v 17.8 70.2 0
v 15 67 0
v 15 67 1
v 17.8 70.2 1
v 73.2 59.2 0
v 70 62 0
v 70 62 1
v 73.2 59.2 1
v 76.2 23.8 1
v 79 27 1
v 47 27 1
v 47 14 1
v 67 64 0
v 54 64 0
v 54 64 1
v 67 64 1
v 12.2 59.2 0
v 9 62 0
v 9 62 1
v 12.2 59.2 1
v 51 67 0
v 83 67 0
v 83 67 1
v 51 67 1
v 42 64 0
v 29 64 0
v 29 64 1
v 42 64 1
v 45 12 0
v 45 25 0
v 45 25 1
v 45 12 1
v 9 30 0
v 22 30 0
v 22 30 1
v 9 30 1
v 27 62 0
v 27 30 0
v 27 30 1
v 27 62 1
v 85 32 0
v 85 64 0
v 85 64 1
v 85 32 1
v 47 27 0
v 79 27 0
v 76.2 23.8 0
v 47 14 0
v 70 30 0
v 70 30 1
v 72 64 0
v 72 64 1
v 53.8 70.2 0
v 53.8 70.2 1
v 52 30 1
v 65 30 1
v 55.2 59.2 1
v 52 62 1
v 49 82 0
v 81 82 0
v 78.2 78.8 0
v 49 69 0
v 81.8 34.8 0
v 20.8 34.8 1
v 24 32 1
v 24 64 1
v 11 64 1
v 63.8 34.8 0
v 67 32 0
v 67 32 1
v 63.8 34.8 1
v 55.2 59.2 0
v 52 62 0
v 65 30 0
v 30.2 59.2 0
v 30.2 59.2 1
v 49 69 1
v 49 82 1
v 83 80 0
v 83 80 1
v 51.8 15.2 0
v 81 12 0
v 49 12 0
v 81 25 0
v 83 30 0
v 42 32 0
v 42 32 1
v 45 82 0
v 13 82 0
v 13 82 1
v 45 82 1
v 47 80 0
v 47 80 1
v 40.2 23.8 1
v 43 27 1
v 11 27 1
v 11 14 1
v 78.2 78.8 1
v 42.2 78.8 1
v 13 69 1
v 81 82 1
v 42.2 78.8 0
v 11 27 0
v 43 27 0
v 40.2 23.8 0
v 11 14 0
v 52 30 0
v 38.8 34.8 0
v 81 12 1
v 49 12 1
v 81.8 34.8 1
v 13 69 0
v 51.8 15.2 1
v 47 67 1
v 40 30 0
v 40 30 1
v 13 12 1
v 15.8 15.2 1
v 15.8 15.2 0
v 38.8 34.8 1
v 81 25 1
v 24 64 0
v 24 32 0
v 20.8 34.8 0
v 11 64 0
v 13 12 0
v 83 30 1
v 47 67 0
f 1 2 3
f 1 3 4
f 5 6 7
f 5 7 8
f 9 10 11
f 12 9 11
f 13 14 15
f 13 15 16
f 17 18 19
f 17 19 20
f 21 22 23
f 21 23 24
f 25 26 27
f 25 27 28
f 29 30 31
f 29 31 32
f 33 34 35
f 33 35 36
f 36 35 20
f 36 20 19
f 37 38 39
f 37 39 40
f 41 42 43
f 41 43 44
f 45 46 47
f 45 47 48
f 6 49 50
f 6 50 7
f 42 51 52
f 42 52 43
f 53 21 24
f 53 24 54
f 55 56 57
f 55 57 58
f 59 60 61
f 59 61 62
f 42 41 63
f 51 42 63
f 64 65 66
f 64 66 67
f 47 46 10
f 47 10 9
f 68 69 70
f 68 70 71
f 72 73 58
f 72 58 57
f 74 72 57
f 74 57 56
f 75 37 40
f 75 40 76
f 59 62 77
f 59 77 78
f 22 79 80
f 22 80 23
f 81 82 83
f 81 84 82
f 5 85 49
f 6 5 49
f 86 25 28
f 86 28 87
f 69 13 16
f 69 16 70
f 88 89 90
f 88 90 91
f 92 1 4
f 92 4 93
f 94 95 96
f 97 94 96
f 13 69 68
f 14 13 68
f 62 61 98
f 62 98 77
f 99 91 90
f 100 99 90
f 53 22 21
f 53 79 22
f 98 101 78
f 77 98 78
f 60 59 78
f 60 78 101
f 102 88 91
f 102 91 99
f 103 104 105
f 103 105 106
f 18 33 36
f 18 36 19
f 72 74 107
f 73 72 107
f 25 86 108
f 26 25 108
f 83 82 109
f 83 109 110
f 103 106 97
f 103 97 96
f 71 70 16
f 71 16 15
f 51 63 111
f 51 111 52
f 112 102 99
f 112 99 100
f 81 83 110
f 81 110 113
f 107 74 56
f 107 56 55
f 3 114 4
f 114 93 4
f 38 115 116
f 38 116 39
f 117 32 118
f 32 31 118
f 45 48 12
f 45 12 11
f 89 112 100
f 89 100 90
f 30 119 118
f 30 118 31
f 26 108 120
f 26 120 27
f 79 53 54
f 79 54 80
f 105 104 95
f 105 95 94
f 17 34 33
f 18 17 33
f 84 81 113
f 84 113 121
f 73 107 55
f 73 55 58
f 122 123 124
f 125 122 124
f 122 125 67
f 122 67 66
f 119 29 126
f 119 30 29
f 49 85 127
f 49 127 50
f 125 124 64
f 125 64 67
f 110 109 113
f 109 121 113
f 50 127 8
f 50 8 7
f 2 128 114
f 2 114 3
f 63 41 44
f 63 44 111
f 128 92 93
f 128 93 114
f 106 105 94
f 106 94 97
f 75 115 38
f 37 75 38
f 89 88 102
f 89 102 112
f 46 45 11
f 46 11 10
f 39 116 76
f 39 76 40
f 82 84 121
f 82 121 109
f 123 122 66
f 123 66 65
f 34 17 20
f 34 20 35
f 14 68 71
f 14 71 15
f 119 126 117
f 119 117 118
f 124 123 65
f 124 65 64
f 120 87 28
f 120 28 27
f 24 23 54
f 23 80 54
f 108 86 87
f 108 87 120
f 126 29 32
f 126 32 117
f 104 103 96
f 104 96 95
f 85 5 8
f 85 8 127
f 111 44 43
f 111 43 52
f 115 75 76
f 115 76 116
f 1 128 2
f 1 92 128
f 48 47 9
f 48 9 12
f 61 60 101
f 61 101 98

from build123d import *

# Parameters (mm, degrees)
BOSS_EXTRUDE1_DEPTH    = 1
BOSS_EXTRUDE1_2_DEPTH  = 1
BOSS_EXTRUDE1_3_DEPTH  = 1
BOSS_EXTRUDE1_4_DEPTH  = 1
BOSS_EXTRUDE1_5_DEPTH  = 1
BOSS_EXTRUDE1_6_DEPTH  = 1
BOSS_EXTRUDE1_7_DEPTH  = 1
BOSS_EXTRUDE1_8_DEPTH  = 1
BOSS_EXTRUDE1_9_DEPTH  = 1
BOSS_EXTRUDE1_10_DEPTH = 1
BOSS_EXTRUDE1_11_DEPTH = 1
BOSS_EXTRUDE1_12_DEPTH = 1
BOSS_EXTRUDE1_13_DEPTH = 1
BOSS_EXTRUDE1_14_DEPTH = 1
BOSS_EXTRUDE1_15_DEPTH = 1
BOSS_EXTRUDE1_16_DEPTH = 1


with BuildPart() as part:
    # Sketch 21 → Boss-Extrude1 (new body)
    with BuildSketch(Plane.XY):
        Polygon((45, 12), (13, 12), (15.8, 15.2), (45, 25), align=None)
    extrude(amount=BOSS_EXTRUDE1_DEPTH)


with BuildPart() as body_2:
    # Sketch 21 → Boss-Extrude1 2 (new body)
    with BuildSketch(Plane.XY):
        Polygon((11, 27), (43, 27), (40.2, 23.8), (11, 14), align=None)
    extrude(amount=BOSS_EXTRUDE1_2_DEPTH)


with BuildPart() as body_3:
    # Sketch 21 → Boss-Extrude1 3 (new body)
    with BuildSketch(Plane.XY):
        Polygon((47, 27), (79, 27), (76.2, 23.8), (47, 14), align=None)
    extrude(amount=BOSS_EXTRUDE1_3_DEPTH)


with BuildPart() as body_4:
    # Sketch 21 → Boss-Extrude1 4 (new body)
    with BuildSketch(Plane.XY):
        Polygon((81, 12), (49, 12), (51.8, 15.2), (81, 25), align=None)
    extrude(amount=BOSS_EXTRUDE1_4_DEPTH)


with BuildPart() as body_5:
    # Sketch 21 → Boss-Extrude1 5 (new body)
    with BuildSketch(Plane.XY):
        Polygon((9, 30), (9, 62), (12.2, 59.2), (22, 30), align=None)
    extrude(amount=BOSS_EXTRUDE1_5_DEPTH)


with BuildPart() as body_6:
    # Sketch 21 → Boss-Extrude1 6 (new body)
    with BuildSketch(Plane.XY):
        Polygon((24, 64), (24, 32), (20.8, 34.8), (11, 64), align=None)
    extrude(amount=BOSS_EXTRUDE1_6_DEPTH)


with BuildPart() as body_7:
    # Sketch 21 → Boss-Extrude1 7 (new body)
    with BuildSketch(Plane.XY):
        Polygon((27, 30), (27, 62), (30.2, 59.2), (40, 30), align=None)
    extrude(amount=BOSS_EXTRUDE1_7_DEPTH)


with BuildPart() as body_8:
    # Sketch 21 → Boss-Extrude1 8 (new body)
    with BuildSketch(Plane.XY):
        Polygon((42, 64), (42, 32), (38.8, 34.8), (29, 64), align=None)
    extrude(amount=BOSS_EXTRUDE1_8_DEPTH)


with BuildPart() as body_9:
    # Sketch 21 → Boss-Extrude1 9 (new body)
    with BuildSketch(Plane.XY):
        Polygon((52, 30), (52, 62), (55.2, 59.2), (65, 30), align=None)
    extrude(amount=BOSS_EXTRUDE1_9_DEPTH)


with BuildPart() as body_10:
    # Sketch 21 → Boss-Extrude1 10 (new body)
    with BuildSketch(Plane.XY):
        Polygon((67, 64), (67, 32), (63.8, 34.8), (54, 64), align=None)
    extrude(amount=BOSS_EXTRUDE1_10_DEPTH)


with BuildPart() as body_11:
    # Sketch 21 → Boss-Extrude1 11 (new body)
    with BuildSketch(Plane.XY):
        Polygon((70, 30), (70, 62), (73.2, 59.2), (83, 30), align=None)
    extrude(amount=BOSS_EXTRUDE1_11_DEPTH)


with BuildPart() as body_12:
    # Sketch 21 → Boss-Extrude1 12 (new body)
    with BuildSketch(Plane.XY):
        Polygon((85, 64), (85, 32), (81.8, 34.8), (72, 64), align=None)
    extrude(amount=BOSS_EXTRUDE1_12_DEPTH)


with BuildPart() as body_13:
    # Sketch 21 → Boss-Extrude1 13 (new body)
    with BuildSketch(Plane.XY):
        Polygon((47, 67), (15, 67), (17.8, 70.2), (47, 80), align=None)
    extrude(amount=BOSS_EXTRUDE1_13_DEPTH)


with BuildPart() as body_14:
    # Sketch 21 → Boss-Extrude1 14 (new body)
    with BuildSketch(Plane.XY):
        Polygon((13, 82), (45, 82), (42.2, 78.8), (13, 69), align=None)
    extrude(amount=BOSS_EXTRUDE1_14_DEPTH)


with BuildPart() as body_15:
    # Sketch 21 → Boss-Extrude1 15 (new body)
    with BuildSketch(Plane.XY):
        Polygon((49, 82), (81, 82), (78.2, 78.8), (49, 69), align=None)
    extrude(amount=BOSS_EXTRUDE1_15_DEPTH)


with BuildPart() as body_16:
    # Sketch 21 → Boss-Extrude1 16 (new body)
    with BuildSketch(Plane.XY):
        Polygon((83, 67), (51, 67), (53.8, 70.2), (83, 80), align=None)
    extrude(amount=BOSS_EXTRUDE1_16_DEPTH)


solid = Compound([part.part, body_2.part, body_3.part, body_4.part, body_5.part, body_6.part, body_7.part, body_8.part, body_9.part, body_10.part, body_11.part, body_12.part, body_13.part, body_14.part, body_15.part, body_16.part])
